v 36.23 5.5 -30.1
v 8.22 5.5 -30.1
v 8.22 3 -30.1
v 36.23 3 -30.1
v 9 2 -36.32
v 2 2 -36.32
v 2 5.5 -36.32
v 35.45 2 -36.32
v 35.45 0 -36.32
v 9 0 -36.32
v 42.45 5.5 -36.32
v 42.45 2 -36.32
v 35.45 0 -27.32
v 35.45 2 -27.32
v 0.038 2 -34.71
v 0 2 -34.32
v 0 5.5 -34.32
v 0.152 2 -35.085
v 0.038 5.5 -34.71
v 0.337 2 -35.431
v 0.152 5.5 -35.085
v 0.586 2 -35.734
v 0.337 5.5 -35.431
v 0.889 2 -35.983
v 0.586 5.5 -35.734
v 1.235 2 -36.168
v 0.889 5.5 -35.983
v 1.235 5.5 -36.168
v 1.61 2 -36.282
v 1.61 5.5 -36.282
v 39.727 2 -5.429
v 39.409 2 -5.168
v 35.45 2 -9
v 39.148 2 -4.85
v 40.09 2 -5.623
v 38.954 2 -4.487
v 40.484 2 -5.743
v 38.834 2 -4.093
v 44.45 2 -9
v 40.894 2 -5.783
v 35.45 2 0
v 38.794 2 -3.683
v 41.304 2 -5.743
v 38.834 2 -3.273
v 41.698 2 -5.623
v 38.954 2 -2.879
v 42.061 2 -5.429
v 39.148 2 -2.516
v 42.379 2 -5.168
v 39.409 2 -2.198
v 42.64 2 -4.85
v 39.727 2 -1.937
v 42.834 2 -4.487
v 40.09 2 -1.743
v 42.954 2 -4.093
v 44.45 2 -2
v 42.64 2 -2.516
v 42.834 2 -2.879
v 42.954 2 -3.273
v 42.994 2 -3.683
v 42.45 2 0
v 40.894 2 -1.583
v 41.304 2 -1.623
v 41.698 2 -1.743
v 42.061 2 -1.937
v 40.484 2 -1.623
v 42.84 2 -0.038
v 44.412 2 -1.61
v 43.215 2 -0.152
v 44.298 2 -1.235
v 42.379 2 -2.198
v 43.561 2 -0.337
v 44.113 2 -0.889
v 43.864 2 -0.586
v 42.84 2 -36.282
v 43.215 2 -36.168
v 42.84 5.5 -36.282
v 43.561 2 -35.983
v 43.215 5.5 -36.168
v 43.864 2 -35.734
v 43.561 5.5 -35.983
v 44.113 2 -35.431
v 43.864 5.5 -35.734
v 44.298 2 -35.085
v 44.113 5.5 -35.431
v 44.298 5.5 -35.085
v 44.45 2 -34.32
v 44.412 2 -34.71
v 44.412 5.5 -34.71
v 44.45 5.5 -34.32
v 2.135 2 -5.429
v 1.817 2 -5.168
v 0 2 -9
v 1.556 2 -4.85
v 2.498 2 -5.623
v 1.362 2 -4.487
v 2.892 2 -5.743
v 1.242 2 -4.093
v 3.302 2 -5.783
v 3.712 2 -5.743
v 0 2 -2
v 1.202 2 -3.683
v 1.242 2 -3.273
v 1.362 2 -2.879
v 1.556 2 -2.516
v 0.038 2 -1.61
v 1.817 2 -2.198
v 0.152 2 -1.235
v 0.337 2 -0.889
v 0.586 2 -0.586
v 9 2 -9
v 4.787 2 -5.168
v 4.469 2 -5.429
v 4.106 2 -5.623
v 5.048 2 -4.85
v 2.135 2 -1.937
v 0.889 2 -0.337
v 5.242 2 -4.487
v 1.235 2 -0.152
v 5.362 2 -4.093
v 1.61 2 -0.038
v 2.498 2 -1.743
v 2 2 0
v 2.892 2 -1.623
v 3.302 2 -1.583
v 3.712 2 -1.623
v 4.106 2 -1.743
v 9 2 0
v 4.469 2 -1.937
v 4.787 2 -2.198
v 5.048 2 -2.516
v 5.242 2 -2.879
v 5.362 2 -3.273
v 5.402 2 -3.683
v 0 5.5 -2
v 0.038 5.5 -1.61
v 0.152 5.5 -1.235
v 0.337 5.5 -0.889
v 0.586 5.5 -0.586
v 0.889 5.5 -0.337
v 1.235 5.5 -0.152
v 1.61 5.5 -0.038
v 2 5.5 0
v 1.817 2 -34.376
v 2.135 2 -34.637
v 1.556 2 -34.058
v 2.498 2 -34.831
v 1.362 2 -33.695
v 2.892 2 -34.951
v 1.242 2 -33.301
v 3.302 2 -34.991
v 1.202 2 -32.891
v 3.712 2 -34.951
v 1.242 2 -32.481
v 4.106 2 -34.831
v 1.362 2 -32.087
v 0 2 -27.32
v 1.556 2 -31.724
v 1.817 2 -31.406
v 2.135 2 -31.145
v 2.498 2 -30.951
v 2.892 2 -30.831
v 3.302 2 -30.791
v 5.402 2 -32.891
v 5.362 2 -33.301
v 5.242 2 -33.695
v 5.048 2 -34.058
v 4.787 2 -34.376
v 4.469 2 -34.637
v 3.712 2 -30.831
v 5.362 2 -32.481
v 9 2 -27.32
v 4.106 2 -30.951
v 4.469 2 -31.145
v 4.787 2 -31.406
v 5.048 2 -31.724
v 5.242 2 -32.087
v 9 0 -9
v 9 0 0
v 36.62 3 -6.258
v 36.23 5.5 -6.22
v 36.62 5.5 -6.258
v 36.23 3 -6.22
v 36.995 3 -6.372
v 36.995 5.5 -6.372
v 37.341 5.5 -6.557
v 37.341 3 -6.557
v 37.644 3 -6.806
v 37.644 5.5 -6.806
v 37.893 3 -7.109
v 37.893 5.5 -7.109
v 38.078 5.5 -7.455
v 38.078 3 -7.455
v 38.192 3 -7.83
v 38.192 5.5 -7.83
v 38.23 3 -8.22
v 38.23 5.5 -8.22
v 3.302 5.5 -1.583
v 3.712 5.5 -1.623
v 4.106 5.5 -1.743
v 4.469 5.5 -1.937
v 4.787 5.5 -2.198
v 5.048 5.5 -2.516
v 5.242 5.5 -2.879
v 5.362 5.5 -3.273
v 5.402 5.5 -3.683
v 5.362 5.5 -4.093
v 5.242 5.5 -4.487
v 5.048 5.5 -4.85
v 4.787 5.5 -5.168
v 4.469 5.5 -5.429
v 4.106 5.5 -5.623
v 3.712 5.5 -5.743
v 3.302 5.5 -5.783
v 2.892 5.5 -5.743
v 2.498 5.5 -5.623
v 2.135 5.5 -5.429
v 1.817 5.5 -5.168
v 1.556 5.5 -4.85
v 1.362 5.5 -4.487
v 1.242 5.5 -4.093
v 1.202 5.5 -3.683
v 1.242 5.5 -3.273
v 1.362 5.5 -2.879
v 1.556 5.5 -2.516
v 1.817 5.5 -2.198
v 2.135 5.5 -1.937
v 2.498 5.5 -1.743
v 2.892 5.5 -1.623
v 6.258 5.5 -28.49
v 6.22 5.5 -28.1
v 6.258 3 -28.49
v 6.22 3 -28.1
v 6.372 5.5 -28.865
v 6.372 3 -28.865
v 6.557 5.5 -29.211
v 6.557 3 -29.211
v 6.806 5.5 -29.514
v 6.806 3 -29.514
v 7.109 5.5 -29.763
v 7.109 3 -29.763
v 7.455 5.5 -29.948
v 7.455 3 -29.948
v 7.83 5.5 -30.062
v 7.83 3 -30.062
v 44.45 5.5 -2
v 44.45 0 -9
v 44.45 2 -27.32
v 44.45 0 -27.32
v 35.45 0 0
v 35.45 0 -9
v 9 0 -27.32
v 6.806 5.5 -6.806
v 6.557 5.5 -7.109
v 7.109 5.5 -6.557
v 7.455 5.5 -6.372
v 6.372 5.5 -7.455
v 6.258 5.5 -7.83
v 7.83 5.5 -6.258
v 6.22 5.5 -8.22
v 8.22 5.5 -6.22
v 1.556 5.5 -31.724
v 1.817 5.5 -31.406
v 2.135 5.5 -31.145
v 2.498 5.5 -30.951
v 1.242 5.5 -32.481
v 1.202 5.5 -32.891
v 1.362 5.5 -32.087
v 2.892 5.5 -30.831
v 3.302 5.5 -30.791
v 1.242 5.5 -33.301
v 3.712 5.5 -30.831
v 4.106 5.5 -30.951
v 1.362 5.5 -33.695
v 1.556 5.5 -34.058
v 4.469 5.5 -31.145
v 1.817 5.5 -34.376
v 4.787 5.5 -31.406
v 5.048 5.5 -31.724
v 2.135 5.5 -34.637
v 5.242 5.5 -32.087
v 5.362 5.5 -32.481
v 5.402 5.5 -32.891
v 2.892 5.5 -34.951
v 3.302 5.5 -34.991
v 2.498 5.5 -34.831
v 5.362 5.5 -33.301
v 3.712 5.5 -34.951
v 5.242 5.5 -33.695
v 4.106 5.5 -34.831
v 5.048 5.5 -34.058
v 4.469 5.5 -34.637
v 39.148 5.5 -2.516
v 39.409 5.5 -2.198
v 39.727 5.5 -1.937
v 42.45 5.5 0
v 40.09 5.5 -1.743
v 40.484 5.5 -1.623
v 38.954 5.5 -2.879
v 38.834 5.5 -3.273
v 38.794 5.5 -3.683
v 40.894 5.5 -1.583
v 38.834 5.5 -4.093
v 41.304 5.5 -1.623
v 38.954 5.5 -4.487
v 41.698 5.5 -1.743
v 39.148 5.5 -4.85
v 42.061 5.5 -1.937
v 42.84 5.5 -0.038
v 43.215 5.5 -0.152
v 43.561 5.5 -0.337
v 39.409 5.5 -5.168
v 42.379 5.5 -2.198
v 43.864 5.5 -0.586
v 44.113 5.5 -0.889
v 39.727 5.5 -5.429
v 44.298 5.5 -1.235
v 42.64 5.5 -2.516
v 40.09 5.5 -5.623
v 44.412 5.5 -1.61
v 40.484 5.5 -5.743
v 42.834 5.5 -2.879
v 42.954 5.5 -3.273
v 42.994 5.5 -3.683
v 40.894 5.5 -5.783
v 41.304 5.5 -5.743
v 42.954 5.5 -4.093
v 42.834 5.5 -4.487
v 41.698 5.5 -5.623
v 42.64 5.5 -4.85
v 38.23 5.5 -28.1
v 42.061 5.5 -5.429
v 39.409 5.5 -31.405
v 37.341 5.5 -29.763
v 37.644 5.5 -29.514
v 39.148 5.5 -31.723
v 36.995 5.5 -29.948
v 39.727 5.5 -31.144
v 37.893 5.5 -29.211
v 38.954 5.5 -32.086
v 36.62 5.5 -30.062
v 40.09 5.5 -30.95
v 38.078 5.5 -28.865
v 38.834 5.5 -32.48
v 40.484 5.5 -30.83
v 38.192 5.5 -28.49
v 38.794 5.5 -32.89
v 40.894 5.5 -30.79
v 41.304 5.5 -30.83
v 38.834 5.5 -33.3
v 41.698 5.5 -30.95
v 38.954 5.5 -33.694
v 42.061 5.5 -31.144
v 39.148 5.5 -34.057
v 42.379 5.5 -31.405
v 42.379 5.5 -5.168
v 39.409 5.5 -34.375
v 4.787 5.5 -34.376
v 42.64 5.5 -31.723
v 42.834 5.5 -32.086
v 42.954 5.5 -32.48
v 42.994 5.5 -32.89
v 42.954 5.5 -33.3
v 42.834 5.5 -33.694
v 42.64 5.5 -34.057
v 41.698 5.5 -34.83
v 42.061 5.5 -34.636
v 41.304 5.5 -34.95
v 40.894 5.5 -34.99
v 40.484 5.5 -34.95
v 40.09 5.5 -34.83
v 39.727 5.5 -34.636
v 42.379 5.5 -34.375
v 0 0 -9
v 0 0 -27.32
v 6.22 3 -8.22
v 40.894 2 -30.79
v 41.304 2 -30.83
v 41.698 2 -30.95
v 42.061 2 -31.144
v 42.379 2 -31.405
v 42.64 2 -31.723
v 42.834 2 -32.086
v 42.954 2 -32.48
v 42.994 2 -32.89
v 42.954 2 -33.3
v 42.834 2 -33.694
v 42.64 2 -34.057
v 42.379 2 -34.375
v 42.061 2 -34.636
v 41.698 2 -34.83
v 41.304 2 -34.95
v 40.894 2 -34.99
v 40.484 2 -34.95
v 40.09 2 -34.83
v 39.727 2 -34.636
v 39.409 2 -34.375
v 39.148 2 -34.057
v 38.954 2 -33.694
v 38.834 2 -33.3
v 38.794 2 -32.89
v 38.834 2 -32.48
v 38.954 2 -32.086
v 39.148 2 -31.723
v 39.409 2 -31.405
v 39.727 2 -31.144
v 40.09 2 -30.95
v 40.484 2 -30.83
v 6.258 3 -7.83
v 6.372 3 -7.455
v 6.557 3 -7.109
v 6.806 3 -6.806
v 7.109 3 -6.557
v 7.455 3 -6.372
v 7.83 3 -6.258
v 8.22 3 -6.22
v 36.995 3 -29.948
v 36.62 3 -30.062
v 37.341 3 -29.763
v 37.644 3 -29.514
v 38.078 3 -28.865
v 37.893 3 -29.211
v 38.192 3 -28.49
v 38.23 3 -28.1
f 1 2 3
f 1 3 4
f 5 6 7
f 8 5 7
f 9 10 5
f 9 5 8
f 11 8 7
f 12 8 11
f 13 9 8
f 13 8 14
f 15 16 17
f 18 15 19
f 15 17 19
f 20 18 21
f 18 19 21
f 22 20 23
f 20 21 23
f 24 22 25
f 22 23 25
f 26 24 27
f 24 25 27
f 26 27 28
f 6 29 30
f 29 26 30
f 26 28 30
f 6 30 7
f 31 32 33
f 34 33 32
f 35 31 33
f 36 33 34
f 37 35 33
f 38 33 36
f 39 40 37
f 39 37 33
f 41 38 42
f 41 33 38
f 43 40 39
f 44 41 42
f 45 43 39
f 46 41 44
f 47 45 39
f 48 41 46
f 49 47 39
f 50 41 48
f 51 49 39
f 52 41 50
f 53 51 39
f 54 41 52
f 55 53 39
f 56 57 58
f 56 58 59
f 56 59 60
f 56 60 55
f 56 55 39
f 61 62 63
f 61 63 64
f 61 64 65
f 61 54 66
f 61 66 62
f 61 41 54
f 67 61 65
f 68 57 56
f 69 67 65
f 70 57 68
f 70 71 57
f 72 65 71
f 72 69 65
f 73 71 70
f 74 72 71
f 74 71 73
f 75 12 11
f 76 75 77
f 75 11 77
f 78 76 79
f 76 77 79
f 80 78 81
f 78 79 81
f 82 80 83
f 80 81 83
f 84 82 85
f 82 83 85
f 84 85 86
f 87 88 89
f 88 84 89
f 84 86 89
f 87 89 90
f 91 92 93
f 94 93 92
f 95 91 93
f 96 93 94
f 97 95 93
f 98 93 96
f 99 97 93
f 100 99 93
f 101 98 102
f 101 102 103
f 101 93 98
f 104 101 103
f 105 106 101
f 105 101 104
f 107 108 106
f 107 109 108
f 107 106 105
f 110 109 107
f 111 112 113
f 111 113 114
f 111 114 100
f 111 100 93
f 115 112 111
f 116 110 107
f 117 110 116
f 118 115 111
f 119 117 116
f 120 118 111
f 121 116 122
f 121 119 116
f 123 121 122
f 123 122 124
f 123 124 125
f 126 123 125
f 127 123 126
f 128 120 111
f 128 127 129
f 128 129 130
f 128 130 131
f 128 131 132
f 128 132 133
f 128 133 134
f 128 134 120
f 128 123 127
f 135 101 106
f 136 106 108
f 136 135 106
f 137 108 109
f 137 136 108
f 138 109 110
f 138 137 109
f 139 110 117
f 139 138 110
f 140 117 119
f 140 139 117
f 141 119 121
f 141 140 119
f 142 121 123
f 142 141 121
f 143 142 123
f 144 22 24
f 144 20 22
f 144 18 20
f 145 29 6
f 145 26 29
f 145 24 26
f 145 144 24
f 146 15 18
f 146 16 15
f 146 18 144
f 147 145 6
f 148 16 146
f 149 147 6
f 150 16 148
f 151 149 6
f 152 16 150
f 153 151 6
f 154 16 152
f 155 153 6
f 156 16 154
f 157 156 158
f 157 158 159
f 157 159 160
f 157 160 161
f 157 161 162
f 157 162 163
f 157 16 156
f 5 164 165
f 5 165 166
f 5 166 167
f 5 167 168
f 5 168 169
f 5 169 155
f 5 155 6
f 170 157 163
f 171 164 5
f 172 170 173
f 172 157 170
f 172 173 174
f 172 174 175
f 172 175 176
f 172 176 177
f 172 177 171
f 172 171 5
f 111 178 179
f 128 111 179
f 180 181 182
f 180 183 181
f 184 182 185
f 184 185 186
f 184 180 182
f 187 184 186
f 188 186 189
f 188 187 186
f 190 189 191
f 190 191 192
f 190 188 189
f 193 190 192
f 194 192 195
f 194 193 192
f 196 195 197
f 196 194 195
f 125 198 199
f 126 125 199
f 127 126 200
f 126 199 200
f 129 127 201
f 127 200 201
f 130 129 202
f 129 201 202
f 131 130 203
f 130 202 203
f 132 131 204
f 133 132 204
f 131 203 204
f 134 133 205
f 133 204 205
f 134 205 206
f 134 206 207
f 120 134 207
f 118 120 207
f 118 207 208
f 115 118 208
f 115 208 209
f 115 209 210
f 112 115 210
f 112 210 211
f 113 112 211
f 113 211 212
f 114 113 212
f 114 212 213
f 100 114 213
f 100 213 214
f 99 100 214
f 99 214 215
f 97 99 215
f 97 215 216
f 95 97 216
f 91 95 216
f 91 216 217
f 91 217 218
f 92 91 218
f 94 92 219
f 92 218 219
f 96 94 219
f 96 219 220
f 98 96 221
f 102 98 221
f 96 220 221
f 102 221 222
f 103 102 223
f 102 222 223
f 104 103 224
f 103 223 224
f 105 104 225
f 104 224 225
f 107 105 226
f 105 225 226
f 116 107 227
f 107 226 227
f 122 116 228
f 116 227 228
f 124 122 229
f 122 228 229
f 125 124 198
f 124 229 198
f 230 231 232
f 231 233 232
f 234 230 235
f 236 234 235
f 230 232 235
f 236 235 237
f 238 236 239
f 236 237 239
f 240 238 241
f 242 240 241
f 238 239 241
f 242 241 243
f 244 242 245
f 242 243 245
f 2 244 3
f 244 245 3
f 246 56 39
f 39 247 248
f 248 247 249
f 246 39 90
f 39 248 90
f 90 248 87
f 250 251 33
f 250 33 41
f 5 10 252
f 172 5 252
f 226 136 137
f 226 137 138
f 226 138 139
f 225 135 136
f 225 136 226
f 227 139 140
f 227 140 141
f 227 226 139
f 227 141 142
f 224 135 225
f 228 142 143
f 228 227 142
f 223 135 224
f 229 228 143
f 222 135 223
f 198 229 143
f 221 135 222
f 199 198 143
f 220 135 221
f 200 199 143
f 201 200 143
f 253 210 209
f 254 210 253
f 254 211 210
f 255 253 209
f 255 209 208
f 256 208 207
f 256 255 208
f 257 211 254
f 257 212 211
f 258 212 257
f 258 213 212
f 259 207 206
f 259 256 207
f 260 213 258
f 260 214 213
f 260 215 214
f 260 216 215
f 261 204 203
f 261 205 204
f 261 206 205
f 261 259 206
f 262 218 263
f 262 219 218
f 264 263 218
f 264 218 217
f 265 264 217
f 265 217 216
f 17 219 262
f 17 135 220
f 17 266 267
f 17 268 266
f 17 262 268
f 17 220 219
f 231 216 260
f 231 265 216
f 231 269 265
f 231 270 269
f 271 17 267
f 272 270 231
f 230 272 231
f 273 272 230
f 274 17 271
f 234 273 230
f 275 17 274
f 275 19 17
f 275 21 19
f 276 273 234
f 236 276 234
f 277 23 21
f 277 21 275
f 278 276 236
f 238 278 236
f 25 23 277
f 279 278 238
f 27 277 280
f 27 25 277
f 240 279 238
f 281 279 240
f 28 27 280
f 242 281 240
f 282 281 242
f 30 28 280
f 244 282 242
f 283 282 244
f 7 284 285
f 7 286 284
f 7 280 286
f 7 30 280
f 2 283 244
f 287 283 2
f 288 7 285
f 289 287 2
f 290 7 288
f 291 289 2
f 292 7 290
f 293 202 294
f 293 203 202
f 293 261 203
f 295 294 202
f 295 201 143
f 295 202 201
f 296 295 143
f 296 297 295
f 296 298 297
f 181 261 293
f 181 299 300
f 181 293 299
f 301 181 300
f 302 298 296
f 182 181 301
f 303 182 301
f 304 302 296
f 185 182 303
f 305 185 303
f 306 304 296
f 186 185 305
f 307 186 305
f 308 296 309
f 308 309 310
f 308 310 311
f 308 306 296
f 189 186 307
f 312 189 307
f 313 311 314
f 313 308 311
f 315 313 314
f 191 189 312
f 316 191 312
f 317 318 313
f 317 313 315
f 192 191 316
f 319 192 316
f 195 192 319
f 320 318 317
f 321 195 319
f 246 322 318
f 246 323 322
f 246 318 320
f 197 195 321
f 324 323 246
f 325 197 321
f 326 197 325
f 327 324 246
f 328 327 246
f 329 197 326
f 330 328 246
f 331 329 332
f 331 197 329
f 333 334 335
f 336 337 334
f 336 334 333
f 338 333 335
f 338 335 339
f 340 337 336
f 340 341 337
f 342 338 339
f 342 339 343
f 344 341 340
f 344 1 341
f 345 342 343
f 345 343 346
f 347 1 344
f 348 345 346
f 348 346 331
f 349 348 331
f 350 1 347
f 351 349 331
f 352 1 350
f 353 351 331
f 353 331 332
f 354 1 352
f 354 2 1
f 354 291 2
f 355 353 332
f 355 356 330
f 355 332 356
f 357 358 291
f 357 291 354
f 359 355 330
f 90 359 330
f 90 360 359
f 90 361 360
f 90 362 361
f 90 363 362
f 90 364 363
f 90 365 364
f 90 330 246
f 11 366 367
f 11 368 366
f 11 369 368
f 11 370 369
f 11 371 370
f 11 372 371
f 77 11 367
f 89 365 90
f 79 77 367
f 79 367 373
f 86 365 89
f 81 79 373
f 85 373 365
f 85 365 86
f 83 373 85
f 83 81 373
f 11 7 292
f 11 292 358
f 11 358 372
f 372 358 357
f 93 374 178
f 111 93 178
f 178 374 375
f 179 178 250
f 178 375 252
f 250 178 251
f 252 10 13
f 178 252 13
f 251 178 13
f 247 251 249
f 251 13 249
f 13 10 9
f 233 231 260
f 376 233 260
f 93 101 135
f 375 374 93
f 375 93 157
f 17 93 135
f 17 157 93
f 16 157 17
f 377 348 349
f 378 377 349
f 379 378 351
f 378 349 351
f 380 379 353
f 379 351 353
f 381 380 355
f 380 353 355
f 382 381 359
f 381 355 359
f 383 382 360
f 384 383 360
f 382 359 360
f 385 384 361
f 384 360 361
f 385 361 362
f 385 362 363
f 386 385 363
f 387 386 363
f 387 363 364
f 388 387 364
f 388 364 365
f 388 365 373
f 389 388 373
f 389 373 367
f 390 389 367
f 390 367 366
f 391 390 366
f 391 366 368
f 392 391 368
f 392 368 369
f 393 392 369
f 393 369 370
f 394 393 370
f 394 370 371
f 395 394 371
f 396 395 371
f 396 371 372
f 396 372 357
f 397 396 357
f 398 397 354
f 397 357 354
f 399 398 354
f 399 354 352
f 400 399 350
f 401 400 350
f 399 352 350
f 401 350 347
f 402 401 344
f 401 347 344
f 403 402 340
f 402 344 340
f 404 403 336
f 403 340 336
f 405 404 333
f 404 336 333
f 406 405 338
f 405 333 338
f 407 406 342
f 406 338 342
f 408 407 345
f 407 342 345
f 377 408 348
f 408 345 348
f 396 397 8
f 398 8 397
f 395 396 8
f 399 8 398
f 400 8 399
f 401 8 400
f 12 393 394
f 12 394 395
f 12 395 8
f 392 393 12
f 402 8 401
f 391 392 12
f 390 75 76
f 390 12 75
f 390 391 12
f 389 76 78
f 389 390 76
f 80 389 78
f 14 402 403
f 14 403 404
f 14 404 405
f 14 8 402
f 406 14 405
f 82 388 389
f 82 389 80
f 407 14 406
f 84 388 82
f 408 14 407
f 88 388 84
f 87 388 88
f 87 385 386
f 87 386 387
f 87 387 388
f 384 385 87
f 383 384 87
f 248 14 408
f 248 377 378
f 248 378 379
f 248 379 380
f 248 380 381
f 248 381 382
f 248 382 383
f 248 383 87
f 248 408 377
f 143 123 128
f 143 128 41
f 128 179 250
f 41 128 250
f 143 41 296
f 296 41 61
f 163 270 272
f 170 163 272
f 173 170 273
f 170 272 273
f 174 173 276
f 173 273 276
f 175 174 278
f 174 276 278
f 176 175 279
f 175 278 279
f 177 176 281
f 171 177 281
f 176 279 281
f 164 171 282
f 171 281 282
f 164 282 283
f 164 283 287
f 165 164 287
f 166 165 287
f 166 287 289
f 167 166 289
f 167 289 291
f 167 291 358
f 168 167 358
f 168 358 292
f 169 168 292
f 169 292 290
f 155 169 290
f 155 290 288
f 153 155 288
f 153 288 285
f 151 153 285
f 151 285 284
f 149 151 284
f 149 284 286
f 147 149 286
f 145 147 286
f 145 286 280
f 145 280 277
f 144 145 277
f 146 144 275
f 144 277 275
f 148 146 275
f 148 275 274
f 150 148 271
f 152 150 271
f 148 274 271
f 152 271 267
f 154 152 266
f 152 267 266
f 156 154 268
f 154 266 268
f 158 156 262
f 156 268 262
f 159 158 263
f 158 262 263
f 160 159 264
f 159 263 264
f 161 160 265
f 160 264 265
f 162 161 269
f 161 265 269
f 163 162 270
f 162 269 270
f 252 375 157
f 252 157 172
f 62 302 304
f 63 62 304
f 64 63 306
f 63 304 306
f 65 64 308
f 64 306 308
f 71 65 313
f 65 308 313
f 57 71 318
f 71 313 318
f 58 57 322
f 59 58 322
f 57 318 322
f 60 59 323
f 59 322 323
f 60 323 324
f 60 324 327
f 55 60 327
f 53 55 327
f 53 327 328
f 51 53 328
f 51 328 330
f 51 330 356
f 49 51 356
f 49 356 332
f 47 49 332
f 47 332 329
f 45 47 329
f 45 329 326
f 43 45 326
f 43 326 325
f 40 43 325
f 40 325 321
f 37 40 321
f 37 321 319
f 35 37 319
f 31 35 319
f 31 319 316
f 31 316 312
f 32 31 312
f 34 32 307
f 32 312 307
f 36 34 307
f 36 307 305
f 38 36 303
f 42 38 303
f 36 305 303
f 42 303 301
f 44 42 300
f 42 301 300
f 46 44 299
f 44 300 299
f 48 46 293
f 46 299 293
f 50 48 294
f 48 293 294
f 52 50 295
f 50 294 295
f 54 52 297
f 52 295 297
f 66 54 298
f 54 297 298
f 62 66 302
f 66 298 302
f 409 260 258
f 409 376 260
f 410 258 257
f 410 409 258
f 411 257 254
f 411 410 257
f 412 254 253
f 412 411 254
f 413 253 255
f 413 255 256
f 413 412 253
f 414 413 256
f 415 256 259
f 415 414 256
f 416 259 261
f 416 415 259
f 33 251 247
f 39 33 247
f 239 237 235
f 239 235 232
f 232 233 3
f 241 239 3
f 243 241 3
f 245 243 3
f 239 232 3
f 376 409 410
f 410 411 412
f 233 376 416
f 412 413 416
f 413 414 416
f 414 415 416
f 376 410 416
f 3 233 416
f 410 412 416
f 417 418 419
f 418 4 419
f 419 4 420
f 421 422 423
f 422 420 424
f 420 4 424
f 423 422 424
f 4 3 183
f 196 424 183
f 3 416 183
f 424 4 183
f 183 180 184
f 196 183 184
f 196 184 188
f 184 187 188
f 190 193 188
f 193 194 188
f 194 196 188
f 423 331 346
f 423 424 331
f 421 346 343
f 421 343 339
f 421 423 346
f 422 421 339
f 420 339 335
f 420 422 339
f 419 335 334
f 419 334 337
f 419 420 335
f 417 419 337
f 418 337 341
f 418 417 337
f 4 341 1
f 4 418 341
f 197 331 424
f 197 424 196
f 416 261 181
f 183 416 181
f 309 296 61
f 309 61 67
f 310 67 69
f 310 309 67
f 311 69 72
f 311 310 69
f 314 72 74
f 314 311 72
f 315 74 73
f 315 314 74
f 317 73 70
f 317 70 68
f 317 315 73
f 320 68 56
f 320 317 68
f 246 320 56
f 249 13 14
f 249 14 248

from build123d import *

# Parameters (mm, degrees)
SKETCH_1_W          = 44.45
SKETCH_1_H          = 36.32
EXTRUDE_1_DEPTH     = 5.5
SKETCH_2_R          = 2.1
CUT_EXTRUDE_1_DEPTH = 58.664502946
FILLET_2_R          = 2
CUT_EXTRUDE_START   = -5.5
SKETCH_5_W          = 32.01
SKETCH_5_H          = 23.88
CUT_EXTRUDE_2_DEPTH = 2.5
FILLET_3_R          = 2
SKETCH_6_W          = 9
SKETCH_6_H          = 9
CUT_EXTRUDE_3_DEPTH = 2


with BuildPart() as part:
    # Эскиз1 → Бобышка-Вытянуть1 (new body)
    with BuildSketch(Plane(origin=(0, 0, 0), x_dir=(1, 0, 0), z_dir=(0, 1, 0))):
        with Locations((22.225, 18.16)):
            Rectangle(SKETCH_1_W, SKETCH_1_H)
    extrude(amount=EXTRUDE_1_DEPTH)

    # Эскиз2 → Вырез-Вытянуть1 (cut, through all)
    with BuildSketch(Plane(origin=(0, 5.5, 0), x_dir=(1, 0, 0), z_dir=(0, 1, 0))):
        with Locations(Location((3.302, 32.891, 0), (0, 0, 270))):
            Circle(SKETCH_2_R)
        with Locations(Location((40.894, 32.89, 0), (0, 0, 270))):
            Circle(SKETCH_2_R)
        with Locations(Location((40.894, 3.683, 0), (0, 0, 270))):
            Circle(SKETCH_2_R)
        with Locations(Location((3.302, 3.683, 0), (0, 0, 270))):
            Circle(SKETCH_2_R)
    extrude(amount=-CUT_EXTRUDE_1_DEPTH, mode=Mode.SUBTRACT)

    # Скругление2
    fillet_2_edges = [part.edges().sort_by_distance(p)[0] for p in [
        (0, 2.75, -36.32),
        (44.45, 2.75, -36.32),
        (44.45, 2.75, 0),
        (0, 2.75, 0),
    ]]
    fillet(fillet_2_edges, radius=FILLET_2_R)

    # Эскиз5 → Вырез-Вытянуть2 (cut)
    with BuildSketch(Plane.XZ.offset(CUT_EXTRUDE_START)):
        with Locations((22.225, -18.16)):
            Rectangle(SKETCH_5_W, SKETCH_5_H)
    extrude(amount=CUT_EXTRUDE_2_DEPTH, mode=Mode.SUBTRACT)

    # Скругление3
    fillet_3_edges = [part.edges().sort_by_distance(p)[0] for p in [
        (6.22, 4.25, -30.1),
        (38.23, 4.25, -30.1),
        (38.23, 4.25, -6.22),
        (6.22, 4.25, -6.22),
    ]]
    fillet(fillet_3_edges, radius=FILLET_3_R)

    # Эскиз6 → Вырез-Вытянуть3 (cut)
    with BuildSketch(Plane.XZ):
        with Locations((4.5, -4.5)):
            Rectangle(SKETCH_6_W, SKETCH_6_H)
        with Locations((39.95, -4.5)):
            Rectangle(SKETCH_6_W, SKETCH_6_H)
        with Locations((39.95, -31.82)):
            Rectangle(SKETCH_6_W, SKETCH_6_H)
        with Locations((4.5, -31.82)):
            Rectangle(SKETCH_6_W, SKETCH_6_H)
    extrude(amount=-CUT_EXTRUDE_3_DEPTH, mode=Mode.SUBTRACT)


solid = part.part
